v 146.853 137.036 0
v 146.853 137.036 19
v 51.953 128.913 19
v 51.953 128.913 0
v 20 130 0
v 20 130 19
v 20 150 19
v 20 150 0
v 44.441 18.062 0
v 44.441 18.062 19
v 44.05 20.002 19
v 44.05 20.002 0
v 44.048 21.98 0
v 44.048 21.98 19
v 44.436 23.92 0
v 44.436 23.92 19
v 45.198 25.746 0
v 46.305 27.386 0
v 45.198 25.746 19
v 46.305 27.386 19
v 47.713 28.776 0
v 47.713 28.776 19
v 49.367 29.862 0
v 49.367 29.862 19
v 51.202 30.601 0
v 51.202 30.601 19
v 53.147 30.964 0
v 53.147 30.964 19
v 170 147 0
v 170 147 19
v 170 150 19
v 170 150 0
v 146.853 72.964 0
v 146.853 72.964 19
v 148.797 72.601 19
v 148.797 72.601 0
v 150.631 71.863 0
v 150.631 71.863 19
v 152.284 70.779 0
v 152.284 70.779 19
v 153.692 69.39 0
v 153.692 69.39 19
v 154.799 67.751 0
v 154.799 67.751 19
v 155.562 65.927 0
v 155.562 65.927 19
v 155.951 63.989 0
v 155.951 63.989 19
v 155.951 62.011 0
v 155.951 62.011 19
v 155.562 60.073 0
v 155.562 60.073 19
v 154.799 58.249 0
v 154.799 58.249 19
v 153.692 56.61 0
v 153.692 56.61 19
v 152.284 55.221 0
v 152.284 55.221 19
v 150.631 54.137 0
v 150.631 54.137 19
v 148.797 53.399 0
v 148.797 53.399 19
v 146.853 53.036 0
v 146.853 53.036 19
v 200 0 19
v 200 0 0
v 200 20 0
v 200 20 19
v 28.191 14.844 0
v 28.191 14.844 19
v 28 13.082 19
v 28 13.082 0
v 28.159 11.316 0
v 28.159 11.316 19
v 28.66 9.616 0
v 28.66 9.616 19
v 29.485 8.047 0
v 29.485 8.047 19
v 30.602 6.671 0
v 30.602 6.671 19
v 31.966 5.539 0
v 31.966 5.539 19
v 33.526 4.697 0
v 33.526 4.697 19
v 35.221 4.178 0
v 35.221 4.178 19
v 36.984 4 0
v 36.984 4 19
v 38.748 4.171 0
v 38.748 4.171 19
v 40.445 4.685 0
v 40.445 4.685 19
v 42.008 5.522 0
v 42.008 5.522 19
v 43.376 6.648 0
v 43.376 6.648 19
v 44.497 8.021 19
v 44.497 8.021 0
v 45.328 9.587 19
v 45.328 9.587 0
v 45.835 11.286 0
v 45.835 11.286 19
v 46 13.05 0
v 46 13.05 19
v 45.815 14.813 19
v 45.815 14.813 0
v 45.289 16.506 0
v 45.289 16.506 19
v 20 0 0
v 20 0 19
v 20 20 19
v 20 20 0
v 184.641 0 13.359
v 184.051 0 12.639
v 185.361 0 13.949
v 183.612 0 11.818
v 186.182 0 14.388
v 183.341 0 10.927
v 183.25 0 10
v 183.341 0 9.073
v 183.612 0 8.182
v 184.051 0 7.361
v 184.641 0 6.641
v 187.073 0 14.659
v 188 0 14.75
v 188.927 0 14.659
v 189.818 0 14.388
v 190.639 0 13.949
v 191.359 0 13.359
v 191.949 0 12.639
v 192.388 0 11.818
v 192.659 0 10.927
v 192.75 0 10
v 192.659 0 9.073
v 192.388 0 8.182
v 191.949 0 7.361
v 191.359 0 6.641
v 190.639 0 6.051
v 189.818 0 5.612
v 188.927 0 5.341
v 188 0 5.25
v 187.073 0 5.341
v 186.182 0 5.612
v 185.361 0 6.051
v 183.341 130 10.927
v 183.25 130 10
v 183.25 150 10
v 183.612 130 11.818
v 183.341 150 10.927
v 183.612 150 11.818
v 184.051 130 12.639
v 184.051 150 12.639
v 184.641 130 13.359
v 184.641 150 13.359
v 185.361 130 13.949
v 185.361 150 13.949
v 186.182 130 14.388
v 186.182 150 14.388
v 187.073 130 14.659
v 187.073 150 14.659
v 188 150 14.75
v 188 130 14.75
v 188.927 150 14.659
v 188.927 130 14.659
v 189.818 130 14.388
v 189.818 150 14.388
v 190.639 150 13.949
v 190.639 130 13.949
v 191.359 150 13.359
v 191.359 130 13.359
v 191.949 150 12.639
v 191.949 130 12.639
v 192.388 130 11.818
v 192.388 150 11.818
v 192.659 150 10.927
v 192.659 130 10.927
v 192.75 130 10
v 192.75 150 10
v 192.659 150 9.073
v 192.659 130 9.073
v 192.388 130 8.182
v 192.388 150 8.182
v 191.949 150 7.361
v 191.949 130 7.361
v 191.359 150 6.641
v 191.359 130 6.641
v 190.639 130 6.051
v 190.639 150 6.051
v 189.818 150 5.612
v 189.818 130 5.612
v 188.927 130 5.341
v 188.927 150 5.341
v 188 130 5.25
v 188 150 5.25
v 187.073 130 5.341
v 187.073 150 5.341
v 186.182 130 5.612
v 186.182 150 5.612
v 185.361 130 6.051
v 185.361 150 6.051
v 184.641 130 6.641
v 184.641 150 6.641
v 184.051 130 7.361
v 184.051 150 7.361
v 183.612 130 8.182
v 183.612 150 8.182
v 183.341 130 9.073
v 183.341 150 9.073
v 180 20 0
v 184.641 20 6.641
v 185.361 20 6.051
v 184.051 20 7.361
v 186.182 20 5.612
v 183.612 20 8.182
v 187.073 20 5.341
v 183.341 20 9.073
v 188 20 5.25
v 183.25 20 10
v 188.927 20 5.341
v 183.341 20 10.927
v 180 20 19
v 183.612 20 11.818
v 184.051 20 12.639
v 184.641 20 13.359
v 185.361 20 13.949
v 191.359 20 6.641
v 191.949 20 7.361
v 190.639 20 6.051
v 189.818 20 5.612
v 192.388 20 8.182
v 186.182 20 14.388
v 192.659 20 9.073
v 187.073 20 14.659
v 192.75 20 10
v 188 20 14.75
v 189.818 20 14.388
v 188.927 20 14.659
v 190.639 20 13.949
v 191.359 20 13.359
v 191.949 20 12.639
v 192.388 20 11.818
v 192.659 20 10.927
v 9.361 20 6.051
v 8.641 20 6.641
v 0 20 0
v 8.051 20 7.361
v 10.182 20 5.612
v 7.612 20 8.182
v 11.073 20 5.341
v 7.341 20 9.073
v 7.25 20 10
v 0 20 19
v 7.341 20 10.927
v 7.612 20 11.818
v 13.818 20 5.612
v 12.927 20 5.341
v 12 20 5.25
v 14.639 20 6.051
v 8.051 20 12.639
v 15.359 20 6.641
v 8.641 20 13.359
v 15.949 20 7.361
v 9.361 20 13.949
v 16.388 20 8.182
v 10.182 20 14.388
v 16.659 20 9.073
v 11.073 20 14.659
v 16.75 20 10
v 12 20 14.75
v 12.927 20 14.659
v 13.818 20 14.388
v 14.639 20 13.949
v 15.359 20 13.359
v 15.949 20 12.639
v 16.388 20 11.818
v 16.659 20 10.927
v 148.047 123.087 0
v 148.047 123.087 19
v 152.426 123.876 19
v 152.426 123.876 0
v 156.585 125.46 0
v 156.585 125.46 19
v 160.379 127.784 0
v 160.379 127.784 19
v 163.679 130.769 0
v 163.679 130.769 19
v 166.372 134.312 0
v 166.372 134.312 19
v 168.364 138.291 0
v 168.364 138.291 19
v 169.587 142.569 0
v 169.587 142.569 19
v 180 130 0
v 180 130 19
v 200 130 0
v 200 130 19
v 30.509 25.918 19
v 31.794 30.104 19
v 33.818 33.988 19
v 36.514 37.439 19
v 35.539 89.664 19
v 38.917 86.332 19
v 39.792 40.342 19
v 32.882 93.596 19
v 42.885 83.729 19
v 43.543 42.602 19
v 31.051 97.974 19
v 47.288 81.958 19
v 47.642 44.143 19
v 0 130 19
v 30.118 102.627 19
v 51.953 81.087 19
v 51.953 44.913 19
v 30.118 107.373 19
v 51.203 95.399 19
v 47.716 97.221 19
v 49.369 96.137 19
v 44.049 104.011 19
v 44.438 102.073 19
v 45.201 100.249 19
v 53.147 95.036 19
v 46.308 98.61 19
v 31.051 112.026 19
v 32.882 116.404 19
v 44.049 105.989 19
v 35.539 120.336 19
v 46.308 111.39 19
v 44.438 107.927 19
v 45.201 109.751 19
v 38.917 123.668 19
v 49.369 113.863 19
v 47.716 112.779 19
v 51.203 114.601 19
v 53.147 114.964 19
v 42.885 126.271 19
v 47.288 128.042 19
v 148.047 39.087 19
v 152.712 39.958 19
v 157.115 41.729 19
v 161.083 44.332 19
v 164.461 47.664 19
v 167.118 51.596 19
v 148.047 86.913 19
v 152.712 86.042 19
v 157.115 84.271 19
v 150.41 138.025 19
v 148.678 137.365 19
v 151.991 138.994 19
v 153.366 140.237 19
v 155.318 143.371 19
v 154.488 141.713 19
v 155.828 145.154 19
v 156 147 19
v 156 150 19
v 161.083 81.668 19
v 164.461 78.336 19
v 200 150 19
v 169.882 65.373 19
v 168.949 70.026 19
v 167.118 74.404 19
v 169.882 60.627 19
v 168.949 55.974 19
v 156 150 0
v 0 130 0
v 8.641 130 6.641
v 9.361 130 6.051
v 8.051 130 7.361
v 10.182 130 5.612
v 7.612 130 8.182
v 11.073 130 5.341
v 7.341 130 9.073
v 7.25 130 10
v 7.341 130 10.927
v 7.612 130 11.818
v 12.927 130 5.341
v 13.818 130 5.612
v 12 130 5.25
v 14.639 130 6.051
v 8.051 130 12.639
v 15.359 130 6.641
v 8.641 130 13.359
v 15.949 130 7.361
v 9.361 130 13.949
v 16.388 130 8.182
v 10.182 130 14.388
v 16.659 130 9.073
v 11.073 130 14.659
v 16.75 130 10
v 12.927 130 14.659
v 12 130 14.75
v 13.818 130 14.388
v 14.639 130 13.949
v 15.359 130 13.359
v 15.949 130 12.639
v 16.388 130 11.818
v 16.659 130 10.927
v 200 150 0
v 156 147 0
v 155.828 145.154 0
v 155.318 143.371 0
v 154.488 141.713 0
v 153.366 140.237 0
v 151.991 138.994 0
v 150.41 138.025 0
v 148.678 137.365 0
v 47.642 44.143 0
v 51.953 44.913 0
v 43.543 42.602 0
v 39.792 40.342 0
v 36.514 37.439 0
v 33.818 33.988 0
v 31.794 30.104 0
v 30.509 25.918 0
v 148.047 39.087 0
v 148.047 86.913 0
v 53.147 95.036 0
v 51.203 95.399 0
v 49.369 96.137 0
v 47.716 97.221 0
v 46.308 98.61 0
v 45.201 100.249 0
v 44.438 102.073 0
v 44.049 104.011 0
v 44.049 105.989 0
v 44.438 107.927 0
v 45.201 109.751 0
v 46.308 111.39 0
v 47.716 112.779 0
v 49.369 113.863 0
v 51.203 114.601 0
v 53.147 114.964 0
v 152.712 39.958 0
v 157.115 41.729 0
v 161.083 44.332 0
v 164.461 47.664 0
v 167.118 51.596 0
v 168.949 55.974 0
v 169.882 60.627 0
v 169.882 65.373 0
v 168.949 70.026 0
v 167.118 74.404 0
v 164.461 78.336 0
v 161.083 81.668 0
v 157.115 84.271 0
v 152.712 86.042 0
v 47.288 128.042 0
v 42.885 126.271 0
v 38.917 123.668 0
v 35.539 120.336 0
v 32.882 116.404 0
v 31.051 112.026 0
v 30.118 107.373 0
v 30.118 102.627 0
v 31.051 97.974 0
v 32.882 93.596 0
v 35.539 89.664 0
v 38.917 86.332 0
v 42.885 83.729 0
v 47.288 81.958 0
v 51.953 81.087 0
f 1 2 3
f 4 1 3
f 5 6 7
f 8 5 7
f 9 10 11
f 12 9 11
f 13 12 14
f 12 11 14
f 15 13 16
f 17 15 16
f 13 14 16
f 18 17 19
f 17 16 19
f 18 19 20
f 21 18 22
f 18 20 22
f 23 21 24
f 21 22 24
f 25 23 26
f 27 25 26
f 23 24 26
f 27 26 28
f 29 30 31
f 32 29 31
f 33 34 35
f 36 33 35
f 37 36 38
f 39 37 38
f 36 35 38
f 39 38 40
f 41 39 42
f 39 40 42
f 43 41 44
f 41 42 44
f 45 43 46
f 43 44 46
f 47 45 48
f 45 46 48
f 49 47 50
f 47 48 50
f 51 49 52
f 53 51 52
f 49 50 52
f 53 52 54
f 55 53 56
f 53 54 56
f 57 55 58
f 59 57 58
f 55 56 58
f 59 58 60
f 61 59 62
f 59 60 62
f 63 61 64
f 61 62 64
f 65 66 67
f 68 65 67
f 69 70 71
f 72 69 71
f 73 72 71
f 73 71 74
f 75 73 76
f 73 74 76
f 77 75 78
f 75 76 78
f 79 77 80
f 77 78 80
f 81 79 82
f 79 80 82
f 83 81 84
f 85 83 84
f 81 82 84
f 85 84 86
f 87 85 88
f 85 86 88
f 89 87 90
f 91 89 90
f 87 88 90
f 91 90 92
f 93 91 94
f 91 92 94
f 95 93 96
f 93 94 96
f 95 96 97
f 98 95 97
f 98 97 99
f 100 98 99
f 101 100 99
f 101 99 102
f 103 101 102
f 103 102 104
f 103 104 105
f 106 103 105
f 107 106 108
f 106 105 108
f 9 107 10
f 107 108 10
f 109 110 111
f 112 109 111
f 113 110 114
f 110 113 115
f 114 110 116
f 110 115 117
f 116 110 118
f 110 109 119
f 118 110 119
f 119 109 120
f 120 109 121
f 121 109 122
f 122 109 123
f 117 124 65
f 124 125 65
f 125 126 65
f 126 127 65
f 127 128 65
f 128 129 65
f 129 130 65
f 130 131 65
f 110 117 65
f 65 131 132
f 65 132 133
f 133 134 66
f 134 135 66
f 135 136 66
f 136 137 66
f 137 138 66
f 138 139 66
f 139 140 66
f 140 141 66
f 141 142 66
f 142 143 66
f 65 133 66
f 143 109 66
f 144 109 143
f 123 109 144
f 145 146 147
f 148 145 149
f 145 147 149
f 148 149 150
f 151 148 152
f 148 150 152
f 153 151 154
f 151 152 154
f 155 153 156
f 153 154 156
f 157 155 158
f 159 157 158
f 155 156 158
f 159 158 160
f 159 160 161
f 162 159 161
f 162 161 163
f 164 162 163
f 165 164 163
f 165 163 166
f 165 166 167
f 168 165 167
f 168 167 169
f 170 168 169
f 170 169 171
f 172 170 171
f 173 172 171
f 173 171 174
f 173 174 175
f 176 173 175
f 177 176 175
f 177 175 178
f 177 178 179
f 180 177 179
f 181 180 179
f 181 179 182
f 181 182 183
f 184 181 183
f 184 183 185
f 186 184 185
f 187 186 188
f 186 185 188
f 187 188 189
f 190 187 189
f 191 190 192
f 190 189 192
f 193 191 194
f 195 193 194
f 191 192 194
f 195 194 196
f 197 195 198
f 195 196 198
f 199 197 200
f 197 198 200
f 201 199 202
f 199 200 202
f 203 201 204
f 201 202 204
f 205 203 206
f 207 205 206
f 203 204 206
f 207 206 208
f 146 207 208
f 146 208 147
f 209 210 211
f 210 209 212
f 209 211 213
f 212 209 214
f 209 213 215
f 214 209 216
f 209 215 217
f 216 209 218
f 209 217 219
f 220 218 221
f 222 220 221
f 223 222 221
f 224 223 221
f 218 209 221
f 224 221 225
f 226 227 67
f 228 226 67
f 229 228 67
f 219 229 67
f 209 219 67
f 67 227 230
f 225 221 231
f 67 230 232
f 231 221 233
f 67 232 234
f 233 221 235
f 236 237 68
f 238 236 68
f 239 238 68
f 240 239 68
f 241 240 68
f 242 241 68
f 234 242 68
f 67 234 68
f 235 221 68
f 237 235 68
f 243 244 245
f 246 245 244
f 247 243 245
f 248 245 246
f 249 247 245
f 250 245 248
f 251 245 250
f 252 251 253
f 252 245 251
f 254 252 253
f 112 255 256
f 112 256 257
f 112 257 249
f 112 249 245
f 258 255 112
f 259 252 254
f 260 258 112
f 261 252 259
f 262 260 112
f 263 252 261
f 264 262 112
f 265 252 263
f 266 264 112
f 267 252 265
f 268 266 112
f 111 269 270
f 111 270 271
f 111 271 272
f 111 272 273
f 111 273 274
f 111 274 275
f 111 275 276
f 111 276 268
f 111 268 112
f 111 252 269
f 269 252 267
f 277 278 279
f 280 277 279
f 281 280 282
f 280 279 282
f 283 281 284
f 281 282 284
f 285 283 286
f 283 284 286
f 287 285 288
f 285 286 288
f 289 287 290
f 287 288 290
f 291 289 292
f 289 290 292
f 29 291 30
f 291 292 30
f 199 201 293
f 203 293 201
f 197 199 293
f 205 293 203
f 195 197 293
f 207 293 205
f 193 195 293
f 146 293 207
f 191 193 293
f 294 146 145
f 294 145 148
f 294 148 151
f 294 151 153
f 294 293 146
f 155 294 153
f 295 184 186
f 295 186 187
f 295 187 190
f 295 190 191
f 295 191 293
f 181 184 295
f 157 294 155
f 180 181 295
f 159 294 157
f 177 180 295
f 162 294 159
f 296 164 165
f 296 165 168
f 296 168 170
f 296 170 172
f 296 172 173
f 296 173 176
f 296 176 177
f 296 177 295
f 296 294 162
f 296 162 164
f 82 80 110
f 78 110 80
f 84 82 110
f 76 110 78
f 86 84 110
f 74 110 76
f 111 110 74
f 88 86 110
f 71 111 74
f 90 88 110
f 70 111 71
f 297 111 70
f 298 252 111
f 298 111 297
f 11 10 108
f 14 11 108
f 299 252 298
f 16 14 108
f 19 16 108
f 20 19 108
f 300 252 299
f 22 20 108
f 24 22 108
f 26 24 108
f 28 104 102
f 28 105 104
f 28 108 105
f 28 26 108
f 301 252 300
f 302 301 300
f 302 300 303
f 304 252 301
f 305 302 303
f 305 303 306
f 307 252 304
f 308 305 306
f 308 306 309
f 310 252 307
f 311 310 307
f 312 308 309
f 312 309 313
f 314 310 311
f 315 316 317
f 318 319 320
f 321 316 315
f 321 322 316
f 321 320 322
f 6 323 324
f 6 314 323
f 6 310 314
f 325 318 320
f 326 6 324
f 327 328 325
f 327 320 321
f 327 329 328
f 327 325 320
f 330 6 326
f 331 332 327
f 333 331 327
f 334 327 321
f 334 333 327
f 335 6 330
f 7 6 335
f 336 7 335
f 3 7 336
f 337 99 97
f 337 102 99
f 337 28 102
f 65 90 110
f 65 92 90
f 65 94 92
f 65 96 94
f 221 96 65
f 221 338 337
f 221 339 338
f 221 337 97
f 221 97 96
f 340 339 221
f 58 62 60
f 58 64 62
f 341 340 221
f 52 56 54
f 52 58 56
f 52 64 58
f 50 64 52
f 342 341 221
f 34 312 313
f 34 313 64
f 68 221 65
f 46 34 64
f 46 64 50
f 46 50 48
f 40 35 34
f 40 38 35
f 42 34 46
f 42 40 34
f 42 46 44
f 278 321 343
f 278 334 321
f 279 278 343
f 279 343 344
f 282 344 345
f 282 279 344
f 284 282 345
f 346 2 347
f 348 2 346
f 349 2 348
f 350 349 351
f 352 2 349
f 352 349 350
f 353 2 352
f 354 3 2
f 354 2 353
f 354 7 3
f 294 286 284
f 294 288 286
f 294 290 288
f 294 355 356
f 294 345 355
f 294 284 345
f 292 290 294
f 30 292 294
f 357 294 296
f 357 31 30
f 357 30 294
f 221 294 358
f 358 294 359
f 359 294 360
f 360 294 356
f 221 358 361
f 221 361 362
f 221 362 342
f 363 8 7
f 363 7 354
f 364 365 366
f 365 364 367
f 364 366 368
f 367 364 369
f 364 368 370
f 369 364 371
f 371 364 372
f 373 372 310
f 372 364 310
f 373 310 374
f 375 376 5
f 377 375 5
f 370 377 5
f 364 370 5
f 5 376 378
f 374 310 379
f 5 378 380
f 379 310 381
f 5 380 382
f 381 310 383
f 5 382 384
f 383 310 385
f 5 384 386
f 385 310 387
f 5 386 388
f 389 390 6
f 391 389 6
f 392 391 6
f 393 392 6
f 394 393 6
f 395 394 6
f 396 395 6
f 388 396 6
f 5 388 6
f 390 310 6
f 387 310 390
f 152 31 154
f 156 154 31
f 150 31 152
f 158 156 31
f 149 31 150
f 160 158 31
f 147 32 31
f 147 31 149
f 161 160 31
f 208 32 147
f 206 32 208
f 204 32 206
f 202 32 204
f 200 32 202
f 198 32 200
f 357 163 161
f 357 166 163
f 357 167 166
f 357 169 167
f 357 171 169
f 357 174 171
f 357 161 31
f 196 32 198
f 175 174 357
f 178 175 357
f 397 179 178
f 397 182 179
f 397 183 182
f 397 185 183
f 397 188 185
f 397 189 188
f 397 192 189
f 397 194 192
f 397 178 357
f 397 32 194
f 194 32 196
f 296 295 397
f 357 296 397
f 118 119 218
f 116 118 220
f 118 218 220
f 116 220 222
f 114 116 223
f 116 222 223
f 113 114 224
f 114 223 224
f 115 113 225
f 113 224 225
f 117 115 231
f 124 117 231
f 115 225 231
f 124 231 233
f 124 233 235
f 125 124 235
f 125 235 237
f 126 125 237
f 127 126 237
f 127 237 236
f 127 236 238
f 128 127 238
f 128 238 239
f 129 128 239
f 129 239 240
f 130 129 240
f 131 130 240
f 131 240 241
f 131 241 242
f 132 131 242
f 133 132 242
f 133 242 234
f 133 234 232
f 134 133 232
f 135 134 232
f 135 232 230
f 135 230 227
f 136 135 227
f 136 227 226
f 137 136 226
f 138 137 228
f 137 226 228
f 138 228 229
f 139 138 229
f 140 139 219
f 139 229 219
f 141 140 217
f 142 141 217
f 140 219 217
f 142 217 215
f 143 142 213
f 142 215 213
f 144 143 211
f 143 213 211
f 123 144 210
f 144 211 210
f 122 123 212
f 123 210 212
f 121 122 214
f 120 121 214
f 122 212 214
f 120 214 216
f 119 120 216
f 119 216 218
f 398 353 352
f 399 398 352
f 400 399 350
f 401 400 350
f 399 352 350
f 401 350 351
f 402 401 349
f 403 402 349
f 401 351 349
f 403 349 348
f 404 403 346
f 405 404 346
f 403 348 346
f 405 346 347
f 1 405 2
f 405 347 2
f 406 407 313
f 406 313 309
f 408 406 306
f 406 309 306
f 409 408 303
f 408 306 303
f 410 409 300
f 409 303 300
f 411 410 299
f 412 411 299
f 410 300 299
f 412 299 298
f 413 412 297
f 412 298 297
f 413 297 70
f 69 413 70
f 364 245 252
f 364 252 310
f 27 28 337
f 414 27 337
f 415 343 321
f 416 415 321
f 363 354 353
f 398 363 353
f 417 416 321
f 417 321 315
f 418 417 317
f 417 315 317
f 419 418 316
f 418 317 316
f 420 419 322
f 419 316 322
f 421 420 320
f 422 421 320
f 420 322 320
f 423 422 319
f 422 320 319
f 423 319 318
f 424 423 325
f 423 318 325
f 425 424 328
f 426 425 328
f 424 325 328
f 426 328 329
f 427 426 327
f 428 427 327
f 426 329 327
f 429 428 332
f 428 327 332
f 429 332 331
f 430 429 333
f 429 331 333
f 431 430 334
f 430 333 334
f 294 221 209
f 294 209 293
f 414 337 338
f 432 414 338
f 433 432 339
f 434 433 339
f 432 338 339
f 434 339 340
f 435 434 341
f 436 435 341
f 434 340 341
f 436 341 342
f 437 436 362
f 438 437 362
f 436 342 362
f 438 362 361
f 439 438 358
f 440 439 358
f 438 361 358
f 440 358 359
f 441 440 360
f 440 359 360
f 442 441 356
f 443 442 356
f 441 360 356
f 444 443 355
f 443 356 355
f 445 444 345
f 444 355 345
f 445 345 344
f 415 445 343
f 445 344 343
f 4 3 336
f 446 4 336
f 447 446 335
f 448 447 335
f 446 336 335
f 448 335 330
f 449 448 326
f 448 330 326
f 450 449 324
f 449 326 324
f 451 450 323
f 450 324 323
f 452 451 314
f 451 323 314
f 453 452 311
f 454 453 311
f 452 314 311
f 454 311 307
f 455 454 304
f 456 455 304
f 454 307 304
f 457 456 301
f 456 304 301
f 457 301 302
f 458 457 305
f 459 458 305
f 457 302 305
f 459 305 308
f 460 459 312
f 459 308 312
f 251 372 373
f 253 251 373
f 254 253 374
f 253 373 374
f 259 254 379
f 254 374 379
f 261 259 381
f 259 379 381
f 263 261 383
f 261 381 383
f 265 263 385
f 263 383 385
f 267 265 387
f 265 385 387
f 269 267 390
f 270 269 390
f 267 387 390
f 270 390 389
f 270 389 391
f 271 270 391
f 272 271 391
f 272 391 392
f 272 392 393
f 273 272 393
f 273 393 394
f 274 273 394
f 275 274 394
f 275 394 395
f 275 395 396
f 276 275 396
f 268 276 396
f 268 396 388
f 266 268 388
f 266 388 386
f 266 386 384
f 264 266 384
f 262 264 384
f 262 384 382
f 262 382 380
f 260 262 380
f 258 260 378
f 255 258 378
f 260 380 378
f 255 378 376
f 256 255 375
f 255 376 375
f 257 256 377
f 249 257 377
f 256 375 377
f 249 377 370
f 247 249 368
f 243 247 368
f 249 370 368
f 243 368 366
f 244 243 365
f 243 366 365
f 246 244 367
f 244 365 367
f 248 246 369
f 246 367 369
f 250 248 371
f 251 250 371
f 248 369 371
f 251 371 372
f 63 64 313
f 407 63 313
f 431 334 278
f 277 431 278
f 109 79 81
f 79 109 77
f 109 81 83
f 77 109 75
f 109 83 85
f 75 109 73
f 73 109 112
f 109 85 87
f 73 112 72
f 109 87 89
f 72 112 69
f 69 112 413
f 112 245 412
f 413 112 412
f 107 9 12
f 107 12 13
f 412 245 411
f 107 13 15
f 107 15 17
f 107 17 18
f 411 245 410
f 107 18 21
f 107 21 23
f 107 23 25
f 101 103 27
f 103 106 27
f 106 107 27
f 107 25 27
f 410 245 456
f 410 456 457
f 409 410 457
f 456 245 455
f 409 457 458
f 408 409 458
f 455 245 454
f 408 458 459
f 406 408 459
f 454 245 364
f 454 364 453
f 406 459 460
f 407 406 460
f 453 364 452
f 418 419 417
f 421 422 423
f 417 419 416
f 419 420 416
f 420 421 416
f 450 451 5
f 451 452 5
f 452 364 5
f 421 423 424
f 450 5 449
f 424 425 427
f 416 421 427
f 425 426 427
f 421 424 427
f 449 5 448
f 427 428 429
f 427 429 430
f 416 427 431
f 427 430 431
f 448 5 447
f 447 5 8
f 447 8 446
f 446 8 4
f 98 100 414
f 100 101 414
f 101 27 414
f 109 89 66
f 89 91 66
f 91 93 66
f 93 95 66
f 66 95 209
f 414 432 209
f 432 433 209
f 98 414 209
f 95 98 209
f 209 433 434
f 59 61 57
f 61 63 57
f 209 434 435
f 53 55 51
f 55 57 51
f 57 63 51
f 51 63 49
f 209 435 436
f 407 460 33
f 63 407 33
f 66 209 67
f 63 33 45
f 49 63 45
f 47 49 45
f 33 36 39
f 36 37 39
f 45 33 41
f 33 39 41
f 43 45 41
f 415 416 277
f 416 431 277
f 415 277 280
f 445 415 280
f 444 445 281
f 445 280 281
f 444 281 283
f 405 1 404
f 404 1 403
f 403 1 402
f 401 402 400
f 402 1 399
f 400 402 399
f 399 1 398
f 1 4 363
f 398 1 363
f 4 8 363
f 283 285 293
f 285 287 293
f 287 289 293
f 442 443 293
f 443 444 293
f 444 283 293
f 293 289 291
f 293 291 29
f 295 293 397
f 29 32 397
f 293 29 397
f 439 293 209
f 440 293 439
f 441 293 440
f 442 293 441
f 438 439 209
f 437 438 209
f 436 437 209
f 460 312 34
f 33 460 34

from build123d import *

# Parameters (mm, degrees)
F0_W     = 200
F0_H     = 150
F1_DEPTH = 19
F2_W     = 20
F2_H     = 20
F2_H_2   = 110
F3_DEPTH = 19
F4_R     = 4.75
F5_DEPTH = 150
F7_DEPTH = 19


with BuildPart() as f1:
    # F0 (on Top) → F1 (new body)
    with BuildSketch(Plane.XY):
        with Locations((100, 75)):
            Rectangle(F0_W, F0_H)
    extrude(amount=F1_DEPTH)

    # F2 (on face) → F3 (cut)
    with BuildSketch(Plane.XY.offset(19)):
        with Locations((10, 140)):
            Rectangle(F2_W, F2_H)
        with Locations((10, 10)):
            Rectangle(F2_W, F2_H)
        with Locations((190, 75)):
            Rectangle(F2_W, F2_H_2)
    extrude(amount=-F3_DEPTH, mode=Mode.SUBTRACT)

    # F4 (on face) → F5 (cut)
    with BuildSketch(Plane(origin=(0, 150, 0), x_dir=(-1, 0, 0), z_dir=(0, 1, 0))):
        with Locations((-12, 10)):
            Circle(F4_R)
        with Locations((-188, 10)):
            Circle(F4_R)
    extrude(amount=-F5_DEPTH, mode=Mode.SUBTRACT)

    # F6 (on face) → F7 (cut)
    with BuildSketch(Plane.XY.offset(19)):
        with BuildLine():
            Line((170, 147), (170, 150))
            Line((170, 150), (156, 150))
            Line((156, 150), (156, 147))
            ThreePointArc((156, 147), (153.366454, 140.237208), (146.852929, 137.036441))
            Line((146.852929, 137.036441), (51.95297, 128.912542))
            ThreePointArc((51.95297, 128.912542), (30, 105), (51.95297, 81.087458))
            Line((51.95297, 81.087458), (146.852929, 72.963559))
            ThreePointArc((146.852929, 72.963559), (156, 63), (146.852929, 53.036441))
            Line((146.852929, 53.036441), (51.95297, 44.912542))
            ThreePointArc((51.95297, 44.912542), (38.08635, 38.965404), (30.509258, 25.917827))
            Line((30.509258, 25.917827), (28.190972, 14.844185))
            ThreePointArc((28.190972, 14.844185), (38.748466, 4.171474), (44.441179, 18.062496))
            ThreePointArc((44.441179, 18.062496), (45.71082, 26.593702), (53.147071, 30.963559))
            Line((53.147071, 30.963559), (148.04703, 39.087458))
            ThreePointArc((148.04703, 39.087458), (170, 63), (148.04703, 86.912542))
            Line((148.04703, 86.912542), (53.147071, 95.036441))
            ThreePointArc((53.147071, 95.036441), (44, 105), (53.147071, 114.963559))
            Line((53.147071, 114.963559), (148.04703, 123.087458))
            ThreePointArc((148.04703, 123.087458), (163.67949, 130.769299), (170, 147))
        make_face()
    extrude(amount=-F7_DEPTH, mode=Mode.SUBTRACT)


solid = f1.part
